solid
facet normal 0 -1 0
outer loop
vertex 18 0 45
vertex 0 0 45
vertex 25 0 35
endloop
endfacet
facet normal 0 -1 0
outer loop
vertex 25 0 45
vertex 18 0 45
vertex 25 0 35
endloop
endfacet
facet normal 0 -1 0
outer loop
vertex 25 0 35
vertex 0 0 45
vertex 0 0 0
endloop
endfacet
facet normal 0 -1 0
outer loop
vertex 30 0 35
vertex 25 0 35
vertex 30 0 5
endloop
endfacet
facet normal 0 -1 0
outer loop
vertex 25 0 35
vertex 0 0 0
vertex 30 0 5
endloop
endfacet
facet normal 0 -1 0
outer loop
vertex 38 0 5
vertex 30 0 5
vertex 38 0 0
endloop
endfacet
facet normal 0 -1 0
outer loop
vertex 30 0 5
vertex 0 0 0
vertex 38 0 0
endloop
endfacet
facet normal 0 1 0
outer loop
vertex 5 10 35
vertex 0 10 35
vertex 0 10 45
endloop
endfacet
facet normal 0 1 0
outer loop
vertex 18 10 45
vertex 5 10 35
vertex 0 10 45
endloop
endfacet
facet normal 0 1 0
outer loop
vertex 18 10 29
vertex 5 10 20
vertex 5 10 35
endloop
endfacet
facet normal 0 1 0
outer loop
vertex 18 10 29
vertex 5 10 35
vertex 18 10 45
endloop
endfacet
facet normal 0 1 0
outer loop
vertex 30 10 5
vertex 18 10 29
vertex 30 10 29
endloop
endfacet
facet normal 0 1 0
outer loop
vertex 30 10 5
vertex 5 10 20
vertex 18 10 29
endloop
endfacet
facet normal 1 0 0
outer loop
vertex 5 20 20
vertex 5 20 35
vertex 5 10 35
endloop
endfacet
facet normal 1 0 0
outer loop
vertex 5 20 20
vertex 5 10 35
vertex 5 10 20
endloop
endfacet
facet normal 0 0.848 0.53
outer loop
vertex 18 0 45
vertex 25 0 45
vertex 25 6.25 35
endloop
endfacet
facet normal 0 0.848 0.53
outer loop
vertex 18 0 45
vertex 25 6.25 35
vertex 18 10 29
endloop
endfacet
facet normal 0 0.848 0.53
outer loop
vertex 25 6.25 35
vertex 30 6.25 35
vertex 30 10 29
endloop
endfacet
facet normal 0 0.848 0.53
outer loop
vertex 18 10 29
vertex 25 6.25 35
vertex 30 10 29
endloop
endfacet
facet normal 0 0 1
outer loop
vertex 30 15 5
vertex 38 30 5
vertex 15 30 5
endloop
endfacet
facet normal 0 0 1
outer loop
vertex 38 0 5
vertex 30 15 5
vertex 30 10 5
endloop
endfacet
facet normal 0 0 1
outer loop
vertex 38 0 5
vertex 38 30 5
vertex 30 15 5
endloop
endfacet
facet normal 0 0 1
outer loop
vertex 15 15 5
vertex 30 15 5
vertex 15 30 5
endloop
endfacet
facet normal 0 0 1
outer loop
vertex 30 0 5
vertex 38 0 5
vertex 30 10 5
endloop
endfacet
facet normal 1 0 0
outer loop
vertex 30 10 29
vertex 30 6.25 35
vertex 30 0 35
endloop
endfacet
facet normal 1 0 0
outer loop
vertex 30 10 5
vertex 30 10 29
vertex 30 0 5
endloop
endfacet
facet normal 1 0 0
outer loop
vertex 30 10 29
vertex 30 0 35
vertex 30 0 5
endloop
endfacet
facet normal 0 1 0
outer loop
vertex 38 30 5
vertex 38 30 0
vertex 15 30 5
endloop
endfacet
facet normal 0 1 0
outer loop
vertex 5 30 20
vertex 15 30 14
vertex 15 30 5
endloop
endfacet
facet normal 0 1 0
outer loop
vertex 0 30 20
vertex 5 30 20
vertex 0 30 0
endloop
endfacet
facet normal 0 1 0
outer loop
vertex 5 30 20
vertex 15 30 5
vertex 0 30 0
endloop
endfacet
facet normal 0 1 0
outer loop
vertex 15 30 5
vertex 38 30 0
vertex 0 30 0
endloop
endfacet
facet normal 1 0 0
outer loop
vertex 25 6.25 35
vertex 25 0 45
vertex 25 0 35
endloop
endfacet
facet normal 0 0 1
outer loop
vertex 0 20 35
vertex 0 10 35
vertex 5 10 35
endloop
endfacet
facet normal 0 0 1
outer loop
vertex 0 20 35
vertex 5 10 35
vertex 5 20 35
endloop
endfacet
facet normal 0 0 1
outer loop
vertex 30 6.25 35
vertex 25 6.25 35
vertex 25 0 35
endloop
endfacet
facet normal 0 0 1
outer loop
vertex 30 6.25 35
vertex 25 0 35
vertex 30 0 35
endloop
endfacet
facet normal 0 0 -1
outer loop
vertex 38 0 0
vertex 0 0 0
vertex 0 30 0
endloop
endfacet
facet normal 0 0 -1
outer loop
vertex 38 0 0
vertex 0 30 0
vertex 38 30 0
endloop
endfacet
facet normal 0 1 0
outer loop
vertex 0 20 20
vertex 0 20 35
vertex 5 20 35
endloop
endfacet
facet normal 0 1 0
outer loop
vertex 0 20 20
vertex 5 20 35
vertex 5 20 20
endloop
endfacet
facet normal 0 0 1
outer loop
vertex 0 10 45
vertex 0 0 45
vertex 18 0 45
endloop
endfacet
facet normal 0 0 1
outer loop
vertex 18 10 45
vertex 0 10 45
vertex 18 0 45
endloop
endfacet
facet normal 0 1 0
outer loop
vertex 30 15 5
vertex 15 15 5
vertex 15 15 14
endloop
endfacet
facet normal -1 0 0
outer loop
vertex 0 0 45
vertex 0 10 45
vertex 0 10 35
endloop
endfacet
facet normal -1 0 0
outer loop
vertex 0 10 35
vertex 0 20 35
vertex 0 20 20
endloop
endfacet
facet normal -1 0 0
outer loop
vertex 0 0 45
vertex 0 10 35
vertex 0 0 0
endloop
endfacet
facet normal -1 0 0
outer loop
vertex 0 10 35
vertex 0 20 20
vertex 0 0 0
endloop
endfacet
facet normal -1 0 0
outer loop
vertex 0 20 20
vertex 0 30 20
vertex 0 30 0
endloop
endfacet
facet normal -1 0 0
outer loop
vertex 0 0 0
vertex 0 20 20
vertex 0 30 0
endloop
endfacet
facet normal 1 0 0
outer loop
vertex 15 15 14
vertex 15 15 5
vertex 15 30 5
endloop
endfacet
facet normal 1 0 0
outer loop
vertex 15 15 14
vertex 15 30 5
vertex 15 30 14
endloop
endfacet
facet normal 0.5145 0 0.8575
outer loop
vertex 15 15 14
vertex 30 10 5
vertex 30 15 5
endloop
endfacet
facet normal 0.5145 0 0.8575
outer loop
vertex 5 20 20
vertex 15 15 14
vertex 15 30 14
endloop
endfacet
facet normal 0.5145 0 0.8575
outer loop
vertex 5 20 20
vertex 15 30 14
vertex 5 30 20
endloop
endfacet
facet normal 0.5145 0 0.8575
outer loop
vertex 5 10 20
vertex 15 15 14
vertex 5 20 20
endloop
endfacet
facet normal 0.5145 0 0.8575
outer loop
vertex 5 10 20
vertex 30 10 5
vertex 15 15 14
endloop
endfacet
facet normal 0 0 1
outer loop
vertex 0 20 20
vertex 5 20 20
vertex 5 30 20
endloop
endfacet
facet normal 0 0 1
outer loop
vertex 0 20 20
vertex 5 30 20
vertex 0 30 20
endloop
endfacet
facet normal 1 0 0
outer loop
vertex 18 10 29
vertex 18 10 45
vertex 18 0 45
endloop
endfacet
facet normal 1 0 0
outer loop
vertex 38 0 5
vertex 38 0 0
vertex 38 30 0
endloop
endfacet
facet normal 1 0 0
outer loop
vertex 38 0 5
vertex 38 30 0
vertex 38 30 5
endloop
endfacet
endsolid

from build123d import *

# Parameters (mm, degrees)
BOSS_EXTRUDE1_DEPTH = 30
SKETCH2_W           = 30
SKETCH2_H           = 45
BOSS_EXTRUDE2_DEPTH = 10
SKETCH3_W           = 15
SKETCH3_H           = 10
BOSS_EXTRUDE3_DEPTH = 5
CUT_EXTRUDE1_DEPTH  = 15
CUT_EXTRUDE2_DEPTH  = 12
SKETCH6_W           = 5
SKETCH6_H           = 10
CUT_EXTRUDE4_DEPTH  = 67.098411479


with BuildPart() as part:
    # Sketch1 → Boss-Extrude1 (new body)
    with BuildSketch(Plane(origin=(0, 0, 0), x_dir=(1, 0, 0), z_dir=(0, 1, 0))):
        Polygon((0, 0), (38, 0), (38, -5), (30, -5), (5, -20), (0, -20), align=None)
    extrude(amount=BOSS_EXTRUDE1_DEPTH)

    # Sketch2 → Boss-Extrude2 (add)
    with BuildSketch(Plane(origin=(0, 0, 0), x_dir=(1, 0, 0), z_dir=(0, 1, 0))):
        with Locations((15, -22.5)):
            Rectangle(SKETCH2_W, SKETCH2_H)
    extrude(amount=BOSS_EXTRUDE2_DEPTH)

    # Sketch3 → Boss-Extrude3 (add)
    with BuildSketch(Plane(origin=(0, 0, 0), x_dir=(0, 0, -1), z_dir=(1, 0, 0))):
        with Locations((-27.5, 15)):
            Rectangle(SKETCH3_W, SKETCH3_H)
    extrude(amount=BOSS_EXTRUDE3_DEPTH)

    # Sketch4 → Cut-Extrude1 (cut)
    with BuildSketch(Plane(origin=(0, 30, 0), x_dir=(1, 0, 0), z_dir=(0, 1, 0))):
        Polygon((30, -5), (15, -5), (15, -14), align=None)
    extrude(amount=-CUT_EXTRUDE1_DEPTH, mode=Mode.SUBTRACT)

    # Sketch5 → Cut-Extrude2 (cut)
    with BuildSketch(Plane(origin=(30, 0, 0), x_dir=(0, 0, -1), z_dir=(1, 0, 0))):
        Polygon((-45, 10), (-45, 0), (-29, 10), align=None)
    extrude(amount=-CUT_EXTRUDE2_DEPTH, mode=Mode.SUBTRACT)

    # Sketch6 → Cut-Extrude4 (cut, through all)
    with BuildSketch(Plane(origin=(0, 0, 0), x_dir=(1, 0, 0), z_dir=(0, 1, 0))):
        with Locations((27.5, -40)):
            Rectangle(SKETCH6_W, SKETCH6_H)
    extrude(amount=CUT_EXTRUDE4_DEPTH, mode=Mode.SUBTRACT)


solid = part.part
